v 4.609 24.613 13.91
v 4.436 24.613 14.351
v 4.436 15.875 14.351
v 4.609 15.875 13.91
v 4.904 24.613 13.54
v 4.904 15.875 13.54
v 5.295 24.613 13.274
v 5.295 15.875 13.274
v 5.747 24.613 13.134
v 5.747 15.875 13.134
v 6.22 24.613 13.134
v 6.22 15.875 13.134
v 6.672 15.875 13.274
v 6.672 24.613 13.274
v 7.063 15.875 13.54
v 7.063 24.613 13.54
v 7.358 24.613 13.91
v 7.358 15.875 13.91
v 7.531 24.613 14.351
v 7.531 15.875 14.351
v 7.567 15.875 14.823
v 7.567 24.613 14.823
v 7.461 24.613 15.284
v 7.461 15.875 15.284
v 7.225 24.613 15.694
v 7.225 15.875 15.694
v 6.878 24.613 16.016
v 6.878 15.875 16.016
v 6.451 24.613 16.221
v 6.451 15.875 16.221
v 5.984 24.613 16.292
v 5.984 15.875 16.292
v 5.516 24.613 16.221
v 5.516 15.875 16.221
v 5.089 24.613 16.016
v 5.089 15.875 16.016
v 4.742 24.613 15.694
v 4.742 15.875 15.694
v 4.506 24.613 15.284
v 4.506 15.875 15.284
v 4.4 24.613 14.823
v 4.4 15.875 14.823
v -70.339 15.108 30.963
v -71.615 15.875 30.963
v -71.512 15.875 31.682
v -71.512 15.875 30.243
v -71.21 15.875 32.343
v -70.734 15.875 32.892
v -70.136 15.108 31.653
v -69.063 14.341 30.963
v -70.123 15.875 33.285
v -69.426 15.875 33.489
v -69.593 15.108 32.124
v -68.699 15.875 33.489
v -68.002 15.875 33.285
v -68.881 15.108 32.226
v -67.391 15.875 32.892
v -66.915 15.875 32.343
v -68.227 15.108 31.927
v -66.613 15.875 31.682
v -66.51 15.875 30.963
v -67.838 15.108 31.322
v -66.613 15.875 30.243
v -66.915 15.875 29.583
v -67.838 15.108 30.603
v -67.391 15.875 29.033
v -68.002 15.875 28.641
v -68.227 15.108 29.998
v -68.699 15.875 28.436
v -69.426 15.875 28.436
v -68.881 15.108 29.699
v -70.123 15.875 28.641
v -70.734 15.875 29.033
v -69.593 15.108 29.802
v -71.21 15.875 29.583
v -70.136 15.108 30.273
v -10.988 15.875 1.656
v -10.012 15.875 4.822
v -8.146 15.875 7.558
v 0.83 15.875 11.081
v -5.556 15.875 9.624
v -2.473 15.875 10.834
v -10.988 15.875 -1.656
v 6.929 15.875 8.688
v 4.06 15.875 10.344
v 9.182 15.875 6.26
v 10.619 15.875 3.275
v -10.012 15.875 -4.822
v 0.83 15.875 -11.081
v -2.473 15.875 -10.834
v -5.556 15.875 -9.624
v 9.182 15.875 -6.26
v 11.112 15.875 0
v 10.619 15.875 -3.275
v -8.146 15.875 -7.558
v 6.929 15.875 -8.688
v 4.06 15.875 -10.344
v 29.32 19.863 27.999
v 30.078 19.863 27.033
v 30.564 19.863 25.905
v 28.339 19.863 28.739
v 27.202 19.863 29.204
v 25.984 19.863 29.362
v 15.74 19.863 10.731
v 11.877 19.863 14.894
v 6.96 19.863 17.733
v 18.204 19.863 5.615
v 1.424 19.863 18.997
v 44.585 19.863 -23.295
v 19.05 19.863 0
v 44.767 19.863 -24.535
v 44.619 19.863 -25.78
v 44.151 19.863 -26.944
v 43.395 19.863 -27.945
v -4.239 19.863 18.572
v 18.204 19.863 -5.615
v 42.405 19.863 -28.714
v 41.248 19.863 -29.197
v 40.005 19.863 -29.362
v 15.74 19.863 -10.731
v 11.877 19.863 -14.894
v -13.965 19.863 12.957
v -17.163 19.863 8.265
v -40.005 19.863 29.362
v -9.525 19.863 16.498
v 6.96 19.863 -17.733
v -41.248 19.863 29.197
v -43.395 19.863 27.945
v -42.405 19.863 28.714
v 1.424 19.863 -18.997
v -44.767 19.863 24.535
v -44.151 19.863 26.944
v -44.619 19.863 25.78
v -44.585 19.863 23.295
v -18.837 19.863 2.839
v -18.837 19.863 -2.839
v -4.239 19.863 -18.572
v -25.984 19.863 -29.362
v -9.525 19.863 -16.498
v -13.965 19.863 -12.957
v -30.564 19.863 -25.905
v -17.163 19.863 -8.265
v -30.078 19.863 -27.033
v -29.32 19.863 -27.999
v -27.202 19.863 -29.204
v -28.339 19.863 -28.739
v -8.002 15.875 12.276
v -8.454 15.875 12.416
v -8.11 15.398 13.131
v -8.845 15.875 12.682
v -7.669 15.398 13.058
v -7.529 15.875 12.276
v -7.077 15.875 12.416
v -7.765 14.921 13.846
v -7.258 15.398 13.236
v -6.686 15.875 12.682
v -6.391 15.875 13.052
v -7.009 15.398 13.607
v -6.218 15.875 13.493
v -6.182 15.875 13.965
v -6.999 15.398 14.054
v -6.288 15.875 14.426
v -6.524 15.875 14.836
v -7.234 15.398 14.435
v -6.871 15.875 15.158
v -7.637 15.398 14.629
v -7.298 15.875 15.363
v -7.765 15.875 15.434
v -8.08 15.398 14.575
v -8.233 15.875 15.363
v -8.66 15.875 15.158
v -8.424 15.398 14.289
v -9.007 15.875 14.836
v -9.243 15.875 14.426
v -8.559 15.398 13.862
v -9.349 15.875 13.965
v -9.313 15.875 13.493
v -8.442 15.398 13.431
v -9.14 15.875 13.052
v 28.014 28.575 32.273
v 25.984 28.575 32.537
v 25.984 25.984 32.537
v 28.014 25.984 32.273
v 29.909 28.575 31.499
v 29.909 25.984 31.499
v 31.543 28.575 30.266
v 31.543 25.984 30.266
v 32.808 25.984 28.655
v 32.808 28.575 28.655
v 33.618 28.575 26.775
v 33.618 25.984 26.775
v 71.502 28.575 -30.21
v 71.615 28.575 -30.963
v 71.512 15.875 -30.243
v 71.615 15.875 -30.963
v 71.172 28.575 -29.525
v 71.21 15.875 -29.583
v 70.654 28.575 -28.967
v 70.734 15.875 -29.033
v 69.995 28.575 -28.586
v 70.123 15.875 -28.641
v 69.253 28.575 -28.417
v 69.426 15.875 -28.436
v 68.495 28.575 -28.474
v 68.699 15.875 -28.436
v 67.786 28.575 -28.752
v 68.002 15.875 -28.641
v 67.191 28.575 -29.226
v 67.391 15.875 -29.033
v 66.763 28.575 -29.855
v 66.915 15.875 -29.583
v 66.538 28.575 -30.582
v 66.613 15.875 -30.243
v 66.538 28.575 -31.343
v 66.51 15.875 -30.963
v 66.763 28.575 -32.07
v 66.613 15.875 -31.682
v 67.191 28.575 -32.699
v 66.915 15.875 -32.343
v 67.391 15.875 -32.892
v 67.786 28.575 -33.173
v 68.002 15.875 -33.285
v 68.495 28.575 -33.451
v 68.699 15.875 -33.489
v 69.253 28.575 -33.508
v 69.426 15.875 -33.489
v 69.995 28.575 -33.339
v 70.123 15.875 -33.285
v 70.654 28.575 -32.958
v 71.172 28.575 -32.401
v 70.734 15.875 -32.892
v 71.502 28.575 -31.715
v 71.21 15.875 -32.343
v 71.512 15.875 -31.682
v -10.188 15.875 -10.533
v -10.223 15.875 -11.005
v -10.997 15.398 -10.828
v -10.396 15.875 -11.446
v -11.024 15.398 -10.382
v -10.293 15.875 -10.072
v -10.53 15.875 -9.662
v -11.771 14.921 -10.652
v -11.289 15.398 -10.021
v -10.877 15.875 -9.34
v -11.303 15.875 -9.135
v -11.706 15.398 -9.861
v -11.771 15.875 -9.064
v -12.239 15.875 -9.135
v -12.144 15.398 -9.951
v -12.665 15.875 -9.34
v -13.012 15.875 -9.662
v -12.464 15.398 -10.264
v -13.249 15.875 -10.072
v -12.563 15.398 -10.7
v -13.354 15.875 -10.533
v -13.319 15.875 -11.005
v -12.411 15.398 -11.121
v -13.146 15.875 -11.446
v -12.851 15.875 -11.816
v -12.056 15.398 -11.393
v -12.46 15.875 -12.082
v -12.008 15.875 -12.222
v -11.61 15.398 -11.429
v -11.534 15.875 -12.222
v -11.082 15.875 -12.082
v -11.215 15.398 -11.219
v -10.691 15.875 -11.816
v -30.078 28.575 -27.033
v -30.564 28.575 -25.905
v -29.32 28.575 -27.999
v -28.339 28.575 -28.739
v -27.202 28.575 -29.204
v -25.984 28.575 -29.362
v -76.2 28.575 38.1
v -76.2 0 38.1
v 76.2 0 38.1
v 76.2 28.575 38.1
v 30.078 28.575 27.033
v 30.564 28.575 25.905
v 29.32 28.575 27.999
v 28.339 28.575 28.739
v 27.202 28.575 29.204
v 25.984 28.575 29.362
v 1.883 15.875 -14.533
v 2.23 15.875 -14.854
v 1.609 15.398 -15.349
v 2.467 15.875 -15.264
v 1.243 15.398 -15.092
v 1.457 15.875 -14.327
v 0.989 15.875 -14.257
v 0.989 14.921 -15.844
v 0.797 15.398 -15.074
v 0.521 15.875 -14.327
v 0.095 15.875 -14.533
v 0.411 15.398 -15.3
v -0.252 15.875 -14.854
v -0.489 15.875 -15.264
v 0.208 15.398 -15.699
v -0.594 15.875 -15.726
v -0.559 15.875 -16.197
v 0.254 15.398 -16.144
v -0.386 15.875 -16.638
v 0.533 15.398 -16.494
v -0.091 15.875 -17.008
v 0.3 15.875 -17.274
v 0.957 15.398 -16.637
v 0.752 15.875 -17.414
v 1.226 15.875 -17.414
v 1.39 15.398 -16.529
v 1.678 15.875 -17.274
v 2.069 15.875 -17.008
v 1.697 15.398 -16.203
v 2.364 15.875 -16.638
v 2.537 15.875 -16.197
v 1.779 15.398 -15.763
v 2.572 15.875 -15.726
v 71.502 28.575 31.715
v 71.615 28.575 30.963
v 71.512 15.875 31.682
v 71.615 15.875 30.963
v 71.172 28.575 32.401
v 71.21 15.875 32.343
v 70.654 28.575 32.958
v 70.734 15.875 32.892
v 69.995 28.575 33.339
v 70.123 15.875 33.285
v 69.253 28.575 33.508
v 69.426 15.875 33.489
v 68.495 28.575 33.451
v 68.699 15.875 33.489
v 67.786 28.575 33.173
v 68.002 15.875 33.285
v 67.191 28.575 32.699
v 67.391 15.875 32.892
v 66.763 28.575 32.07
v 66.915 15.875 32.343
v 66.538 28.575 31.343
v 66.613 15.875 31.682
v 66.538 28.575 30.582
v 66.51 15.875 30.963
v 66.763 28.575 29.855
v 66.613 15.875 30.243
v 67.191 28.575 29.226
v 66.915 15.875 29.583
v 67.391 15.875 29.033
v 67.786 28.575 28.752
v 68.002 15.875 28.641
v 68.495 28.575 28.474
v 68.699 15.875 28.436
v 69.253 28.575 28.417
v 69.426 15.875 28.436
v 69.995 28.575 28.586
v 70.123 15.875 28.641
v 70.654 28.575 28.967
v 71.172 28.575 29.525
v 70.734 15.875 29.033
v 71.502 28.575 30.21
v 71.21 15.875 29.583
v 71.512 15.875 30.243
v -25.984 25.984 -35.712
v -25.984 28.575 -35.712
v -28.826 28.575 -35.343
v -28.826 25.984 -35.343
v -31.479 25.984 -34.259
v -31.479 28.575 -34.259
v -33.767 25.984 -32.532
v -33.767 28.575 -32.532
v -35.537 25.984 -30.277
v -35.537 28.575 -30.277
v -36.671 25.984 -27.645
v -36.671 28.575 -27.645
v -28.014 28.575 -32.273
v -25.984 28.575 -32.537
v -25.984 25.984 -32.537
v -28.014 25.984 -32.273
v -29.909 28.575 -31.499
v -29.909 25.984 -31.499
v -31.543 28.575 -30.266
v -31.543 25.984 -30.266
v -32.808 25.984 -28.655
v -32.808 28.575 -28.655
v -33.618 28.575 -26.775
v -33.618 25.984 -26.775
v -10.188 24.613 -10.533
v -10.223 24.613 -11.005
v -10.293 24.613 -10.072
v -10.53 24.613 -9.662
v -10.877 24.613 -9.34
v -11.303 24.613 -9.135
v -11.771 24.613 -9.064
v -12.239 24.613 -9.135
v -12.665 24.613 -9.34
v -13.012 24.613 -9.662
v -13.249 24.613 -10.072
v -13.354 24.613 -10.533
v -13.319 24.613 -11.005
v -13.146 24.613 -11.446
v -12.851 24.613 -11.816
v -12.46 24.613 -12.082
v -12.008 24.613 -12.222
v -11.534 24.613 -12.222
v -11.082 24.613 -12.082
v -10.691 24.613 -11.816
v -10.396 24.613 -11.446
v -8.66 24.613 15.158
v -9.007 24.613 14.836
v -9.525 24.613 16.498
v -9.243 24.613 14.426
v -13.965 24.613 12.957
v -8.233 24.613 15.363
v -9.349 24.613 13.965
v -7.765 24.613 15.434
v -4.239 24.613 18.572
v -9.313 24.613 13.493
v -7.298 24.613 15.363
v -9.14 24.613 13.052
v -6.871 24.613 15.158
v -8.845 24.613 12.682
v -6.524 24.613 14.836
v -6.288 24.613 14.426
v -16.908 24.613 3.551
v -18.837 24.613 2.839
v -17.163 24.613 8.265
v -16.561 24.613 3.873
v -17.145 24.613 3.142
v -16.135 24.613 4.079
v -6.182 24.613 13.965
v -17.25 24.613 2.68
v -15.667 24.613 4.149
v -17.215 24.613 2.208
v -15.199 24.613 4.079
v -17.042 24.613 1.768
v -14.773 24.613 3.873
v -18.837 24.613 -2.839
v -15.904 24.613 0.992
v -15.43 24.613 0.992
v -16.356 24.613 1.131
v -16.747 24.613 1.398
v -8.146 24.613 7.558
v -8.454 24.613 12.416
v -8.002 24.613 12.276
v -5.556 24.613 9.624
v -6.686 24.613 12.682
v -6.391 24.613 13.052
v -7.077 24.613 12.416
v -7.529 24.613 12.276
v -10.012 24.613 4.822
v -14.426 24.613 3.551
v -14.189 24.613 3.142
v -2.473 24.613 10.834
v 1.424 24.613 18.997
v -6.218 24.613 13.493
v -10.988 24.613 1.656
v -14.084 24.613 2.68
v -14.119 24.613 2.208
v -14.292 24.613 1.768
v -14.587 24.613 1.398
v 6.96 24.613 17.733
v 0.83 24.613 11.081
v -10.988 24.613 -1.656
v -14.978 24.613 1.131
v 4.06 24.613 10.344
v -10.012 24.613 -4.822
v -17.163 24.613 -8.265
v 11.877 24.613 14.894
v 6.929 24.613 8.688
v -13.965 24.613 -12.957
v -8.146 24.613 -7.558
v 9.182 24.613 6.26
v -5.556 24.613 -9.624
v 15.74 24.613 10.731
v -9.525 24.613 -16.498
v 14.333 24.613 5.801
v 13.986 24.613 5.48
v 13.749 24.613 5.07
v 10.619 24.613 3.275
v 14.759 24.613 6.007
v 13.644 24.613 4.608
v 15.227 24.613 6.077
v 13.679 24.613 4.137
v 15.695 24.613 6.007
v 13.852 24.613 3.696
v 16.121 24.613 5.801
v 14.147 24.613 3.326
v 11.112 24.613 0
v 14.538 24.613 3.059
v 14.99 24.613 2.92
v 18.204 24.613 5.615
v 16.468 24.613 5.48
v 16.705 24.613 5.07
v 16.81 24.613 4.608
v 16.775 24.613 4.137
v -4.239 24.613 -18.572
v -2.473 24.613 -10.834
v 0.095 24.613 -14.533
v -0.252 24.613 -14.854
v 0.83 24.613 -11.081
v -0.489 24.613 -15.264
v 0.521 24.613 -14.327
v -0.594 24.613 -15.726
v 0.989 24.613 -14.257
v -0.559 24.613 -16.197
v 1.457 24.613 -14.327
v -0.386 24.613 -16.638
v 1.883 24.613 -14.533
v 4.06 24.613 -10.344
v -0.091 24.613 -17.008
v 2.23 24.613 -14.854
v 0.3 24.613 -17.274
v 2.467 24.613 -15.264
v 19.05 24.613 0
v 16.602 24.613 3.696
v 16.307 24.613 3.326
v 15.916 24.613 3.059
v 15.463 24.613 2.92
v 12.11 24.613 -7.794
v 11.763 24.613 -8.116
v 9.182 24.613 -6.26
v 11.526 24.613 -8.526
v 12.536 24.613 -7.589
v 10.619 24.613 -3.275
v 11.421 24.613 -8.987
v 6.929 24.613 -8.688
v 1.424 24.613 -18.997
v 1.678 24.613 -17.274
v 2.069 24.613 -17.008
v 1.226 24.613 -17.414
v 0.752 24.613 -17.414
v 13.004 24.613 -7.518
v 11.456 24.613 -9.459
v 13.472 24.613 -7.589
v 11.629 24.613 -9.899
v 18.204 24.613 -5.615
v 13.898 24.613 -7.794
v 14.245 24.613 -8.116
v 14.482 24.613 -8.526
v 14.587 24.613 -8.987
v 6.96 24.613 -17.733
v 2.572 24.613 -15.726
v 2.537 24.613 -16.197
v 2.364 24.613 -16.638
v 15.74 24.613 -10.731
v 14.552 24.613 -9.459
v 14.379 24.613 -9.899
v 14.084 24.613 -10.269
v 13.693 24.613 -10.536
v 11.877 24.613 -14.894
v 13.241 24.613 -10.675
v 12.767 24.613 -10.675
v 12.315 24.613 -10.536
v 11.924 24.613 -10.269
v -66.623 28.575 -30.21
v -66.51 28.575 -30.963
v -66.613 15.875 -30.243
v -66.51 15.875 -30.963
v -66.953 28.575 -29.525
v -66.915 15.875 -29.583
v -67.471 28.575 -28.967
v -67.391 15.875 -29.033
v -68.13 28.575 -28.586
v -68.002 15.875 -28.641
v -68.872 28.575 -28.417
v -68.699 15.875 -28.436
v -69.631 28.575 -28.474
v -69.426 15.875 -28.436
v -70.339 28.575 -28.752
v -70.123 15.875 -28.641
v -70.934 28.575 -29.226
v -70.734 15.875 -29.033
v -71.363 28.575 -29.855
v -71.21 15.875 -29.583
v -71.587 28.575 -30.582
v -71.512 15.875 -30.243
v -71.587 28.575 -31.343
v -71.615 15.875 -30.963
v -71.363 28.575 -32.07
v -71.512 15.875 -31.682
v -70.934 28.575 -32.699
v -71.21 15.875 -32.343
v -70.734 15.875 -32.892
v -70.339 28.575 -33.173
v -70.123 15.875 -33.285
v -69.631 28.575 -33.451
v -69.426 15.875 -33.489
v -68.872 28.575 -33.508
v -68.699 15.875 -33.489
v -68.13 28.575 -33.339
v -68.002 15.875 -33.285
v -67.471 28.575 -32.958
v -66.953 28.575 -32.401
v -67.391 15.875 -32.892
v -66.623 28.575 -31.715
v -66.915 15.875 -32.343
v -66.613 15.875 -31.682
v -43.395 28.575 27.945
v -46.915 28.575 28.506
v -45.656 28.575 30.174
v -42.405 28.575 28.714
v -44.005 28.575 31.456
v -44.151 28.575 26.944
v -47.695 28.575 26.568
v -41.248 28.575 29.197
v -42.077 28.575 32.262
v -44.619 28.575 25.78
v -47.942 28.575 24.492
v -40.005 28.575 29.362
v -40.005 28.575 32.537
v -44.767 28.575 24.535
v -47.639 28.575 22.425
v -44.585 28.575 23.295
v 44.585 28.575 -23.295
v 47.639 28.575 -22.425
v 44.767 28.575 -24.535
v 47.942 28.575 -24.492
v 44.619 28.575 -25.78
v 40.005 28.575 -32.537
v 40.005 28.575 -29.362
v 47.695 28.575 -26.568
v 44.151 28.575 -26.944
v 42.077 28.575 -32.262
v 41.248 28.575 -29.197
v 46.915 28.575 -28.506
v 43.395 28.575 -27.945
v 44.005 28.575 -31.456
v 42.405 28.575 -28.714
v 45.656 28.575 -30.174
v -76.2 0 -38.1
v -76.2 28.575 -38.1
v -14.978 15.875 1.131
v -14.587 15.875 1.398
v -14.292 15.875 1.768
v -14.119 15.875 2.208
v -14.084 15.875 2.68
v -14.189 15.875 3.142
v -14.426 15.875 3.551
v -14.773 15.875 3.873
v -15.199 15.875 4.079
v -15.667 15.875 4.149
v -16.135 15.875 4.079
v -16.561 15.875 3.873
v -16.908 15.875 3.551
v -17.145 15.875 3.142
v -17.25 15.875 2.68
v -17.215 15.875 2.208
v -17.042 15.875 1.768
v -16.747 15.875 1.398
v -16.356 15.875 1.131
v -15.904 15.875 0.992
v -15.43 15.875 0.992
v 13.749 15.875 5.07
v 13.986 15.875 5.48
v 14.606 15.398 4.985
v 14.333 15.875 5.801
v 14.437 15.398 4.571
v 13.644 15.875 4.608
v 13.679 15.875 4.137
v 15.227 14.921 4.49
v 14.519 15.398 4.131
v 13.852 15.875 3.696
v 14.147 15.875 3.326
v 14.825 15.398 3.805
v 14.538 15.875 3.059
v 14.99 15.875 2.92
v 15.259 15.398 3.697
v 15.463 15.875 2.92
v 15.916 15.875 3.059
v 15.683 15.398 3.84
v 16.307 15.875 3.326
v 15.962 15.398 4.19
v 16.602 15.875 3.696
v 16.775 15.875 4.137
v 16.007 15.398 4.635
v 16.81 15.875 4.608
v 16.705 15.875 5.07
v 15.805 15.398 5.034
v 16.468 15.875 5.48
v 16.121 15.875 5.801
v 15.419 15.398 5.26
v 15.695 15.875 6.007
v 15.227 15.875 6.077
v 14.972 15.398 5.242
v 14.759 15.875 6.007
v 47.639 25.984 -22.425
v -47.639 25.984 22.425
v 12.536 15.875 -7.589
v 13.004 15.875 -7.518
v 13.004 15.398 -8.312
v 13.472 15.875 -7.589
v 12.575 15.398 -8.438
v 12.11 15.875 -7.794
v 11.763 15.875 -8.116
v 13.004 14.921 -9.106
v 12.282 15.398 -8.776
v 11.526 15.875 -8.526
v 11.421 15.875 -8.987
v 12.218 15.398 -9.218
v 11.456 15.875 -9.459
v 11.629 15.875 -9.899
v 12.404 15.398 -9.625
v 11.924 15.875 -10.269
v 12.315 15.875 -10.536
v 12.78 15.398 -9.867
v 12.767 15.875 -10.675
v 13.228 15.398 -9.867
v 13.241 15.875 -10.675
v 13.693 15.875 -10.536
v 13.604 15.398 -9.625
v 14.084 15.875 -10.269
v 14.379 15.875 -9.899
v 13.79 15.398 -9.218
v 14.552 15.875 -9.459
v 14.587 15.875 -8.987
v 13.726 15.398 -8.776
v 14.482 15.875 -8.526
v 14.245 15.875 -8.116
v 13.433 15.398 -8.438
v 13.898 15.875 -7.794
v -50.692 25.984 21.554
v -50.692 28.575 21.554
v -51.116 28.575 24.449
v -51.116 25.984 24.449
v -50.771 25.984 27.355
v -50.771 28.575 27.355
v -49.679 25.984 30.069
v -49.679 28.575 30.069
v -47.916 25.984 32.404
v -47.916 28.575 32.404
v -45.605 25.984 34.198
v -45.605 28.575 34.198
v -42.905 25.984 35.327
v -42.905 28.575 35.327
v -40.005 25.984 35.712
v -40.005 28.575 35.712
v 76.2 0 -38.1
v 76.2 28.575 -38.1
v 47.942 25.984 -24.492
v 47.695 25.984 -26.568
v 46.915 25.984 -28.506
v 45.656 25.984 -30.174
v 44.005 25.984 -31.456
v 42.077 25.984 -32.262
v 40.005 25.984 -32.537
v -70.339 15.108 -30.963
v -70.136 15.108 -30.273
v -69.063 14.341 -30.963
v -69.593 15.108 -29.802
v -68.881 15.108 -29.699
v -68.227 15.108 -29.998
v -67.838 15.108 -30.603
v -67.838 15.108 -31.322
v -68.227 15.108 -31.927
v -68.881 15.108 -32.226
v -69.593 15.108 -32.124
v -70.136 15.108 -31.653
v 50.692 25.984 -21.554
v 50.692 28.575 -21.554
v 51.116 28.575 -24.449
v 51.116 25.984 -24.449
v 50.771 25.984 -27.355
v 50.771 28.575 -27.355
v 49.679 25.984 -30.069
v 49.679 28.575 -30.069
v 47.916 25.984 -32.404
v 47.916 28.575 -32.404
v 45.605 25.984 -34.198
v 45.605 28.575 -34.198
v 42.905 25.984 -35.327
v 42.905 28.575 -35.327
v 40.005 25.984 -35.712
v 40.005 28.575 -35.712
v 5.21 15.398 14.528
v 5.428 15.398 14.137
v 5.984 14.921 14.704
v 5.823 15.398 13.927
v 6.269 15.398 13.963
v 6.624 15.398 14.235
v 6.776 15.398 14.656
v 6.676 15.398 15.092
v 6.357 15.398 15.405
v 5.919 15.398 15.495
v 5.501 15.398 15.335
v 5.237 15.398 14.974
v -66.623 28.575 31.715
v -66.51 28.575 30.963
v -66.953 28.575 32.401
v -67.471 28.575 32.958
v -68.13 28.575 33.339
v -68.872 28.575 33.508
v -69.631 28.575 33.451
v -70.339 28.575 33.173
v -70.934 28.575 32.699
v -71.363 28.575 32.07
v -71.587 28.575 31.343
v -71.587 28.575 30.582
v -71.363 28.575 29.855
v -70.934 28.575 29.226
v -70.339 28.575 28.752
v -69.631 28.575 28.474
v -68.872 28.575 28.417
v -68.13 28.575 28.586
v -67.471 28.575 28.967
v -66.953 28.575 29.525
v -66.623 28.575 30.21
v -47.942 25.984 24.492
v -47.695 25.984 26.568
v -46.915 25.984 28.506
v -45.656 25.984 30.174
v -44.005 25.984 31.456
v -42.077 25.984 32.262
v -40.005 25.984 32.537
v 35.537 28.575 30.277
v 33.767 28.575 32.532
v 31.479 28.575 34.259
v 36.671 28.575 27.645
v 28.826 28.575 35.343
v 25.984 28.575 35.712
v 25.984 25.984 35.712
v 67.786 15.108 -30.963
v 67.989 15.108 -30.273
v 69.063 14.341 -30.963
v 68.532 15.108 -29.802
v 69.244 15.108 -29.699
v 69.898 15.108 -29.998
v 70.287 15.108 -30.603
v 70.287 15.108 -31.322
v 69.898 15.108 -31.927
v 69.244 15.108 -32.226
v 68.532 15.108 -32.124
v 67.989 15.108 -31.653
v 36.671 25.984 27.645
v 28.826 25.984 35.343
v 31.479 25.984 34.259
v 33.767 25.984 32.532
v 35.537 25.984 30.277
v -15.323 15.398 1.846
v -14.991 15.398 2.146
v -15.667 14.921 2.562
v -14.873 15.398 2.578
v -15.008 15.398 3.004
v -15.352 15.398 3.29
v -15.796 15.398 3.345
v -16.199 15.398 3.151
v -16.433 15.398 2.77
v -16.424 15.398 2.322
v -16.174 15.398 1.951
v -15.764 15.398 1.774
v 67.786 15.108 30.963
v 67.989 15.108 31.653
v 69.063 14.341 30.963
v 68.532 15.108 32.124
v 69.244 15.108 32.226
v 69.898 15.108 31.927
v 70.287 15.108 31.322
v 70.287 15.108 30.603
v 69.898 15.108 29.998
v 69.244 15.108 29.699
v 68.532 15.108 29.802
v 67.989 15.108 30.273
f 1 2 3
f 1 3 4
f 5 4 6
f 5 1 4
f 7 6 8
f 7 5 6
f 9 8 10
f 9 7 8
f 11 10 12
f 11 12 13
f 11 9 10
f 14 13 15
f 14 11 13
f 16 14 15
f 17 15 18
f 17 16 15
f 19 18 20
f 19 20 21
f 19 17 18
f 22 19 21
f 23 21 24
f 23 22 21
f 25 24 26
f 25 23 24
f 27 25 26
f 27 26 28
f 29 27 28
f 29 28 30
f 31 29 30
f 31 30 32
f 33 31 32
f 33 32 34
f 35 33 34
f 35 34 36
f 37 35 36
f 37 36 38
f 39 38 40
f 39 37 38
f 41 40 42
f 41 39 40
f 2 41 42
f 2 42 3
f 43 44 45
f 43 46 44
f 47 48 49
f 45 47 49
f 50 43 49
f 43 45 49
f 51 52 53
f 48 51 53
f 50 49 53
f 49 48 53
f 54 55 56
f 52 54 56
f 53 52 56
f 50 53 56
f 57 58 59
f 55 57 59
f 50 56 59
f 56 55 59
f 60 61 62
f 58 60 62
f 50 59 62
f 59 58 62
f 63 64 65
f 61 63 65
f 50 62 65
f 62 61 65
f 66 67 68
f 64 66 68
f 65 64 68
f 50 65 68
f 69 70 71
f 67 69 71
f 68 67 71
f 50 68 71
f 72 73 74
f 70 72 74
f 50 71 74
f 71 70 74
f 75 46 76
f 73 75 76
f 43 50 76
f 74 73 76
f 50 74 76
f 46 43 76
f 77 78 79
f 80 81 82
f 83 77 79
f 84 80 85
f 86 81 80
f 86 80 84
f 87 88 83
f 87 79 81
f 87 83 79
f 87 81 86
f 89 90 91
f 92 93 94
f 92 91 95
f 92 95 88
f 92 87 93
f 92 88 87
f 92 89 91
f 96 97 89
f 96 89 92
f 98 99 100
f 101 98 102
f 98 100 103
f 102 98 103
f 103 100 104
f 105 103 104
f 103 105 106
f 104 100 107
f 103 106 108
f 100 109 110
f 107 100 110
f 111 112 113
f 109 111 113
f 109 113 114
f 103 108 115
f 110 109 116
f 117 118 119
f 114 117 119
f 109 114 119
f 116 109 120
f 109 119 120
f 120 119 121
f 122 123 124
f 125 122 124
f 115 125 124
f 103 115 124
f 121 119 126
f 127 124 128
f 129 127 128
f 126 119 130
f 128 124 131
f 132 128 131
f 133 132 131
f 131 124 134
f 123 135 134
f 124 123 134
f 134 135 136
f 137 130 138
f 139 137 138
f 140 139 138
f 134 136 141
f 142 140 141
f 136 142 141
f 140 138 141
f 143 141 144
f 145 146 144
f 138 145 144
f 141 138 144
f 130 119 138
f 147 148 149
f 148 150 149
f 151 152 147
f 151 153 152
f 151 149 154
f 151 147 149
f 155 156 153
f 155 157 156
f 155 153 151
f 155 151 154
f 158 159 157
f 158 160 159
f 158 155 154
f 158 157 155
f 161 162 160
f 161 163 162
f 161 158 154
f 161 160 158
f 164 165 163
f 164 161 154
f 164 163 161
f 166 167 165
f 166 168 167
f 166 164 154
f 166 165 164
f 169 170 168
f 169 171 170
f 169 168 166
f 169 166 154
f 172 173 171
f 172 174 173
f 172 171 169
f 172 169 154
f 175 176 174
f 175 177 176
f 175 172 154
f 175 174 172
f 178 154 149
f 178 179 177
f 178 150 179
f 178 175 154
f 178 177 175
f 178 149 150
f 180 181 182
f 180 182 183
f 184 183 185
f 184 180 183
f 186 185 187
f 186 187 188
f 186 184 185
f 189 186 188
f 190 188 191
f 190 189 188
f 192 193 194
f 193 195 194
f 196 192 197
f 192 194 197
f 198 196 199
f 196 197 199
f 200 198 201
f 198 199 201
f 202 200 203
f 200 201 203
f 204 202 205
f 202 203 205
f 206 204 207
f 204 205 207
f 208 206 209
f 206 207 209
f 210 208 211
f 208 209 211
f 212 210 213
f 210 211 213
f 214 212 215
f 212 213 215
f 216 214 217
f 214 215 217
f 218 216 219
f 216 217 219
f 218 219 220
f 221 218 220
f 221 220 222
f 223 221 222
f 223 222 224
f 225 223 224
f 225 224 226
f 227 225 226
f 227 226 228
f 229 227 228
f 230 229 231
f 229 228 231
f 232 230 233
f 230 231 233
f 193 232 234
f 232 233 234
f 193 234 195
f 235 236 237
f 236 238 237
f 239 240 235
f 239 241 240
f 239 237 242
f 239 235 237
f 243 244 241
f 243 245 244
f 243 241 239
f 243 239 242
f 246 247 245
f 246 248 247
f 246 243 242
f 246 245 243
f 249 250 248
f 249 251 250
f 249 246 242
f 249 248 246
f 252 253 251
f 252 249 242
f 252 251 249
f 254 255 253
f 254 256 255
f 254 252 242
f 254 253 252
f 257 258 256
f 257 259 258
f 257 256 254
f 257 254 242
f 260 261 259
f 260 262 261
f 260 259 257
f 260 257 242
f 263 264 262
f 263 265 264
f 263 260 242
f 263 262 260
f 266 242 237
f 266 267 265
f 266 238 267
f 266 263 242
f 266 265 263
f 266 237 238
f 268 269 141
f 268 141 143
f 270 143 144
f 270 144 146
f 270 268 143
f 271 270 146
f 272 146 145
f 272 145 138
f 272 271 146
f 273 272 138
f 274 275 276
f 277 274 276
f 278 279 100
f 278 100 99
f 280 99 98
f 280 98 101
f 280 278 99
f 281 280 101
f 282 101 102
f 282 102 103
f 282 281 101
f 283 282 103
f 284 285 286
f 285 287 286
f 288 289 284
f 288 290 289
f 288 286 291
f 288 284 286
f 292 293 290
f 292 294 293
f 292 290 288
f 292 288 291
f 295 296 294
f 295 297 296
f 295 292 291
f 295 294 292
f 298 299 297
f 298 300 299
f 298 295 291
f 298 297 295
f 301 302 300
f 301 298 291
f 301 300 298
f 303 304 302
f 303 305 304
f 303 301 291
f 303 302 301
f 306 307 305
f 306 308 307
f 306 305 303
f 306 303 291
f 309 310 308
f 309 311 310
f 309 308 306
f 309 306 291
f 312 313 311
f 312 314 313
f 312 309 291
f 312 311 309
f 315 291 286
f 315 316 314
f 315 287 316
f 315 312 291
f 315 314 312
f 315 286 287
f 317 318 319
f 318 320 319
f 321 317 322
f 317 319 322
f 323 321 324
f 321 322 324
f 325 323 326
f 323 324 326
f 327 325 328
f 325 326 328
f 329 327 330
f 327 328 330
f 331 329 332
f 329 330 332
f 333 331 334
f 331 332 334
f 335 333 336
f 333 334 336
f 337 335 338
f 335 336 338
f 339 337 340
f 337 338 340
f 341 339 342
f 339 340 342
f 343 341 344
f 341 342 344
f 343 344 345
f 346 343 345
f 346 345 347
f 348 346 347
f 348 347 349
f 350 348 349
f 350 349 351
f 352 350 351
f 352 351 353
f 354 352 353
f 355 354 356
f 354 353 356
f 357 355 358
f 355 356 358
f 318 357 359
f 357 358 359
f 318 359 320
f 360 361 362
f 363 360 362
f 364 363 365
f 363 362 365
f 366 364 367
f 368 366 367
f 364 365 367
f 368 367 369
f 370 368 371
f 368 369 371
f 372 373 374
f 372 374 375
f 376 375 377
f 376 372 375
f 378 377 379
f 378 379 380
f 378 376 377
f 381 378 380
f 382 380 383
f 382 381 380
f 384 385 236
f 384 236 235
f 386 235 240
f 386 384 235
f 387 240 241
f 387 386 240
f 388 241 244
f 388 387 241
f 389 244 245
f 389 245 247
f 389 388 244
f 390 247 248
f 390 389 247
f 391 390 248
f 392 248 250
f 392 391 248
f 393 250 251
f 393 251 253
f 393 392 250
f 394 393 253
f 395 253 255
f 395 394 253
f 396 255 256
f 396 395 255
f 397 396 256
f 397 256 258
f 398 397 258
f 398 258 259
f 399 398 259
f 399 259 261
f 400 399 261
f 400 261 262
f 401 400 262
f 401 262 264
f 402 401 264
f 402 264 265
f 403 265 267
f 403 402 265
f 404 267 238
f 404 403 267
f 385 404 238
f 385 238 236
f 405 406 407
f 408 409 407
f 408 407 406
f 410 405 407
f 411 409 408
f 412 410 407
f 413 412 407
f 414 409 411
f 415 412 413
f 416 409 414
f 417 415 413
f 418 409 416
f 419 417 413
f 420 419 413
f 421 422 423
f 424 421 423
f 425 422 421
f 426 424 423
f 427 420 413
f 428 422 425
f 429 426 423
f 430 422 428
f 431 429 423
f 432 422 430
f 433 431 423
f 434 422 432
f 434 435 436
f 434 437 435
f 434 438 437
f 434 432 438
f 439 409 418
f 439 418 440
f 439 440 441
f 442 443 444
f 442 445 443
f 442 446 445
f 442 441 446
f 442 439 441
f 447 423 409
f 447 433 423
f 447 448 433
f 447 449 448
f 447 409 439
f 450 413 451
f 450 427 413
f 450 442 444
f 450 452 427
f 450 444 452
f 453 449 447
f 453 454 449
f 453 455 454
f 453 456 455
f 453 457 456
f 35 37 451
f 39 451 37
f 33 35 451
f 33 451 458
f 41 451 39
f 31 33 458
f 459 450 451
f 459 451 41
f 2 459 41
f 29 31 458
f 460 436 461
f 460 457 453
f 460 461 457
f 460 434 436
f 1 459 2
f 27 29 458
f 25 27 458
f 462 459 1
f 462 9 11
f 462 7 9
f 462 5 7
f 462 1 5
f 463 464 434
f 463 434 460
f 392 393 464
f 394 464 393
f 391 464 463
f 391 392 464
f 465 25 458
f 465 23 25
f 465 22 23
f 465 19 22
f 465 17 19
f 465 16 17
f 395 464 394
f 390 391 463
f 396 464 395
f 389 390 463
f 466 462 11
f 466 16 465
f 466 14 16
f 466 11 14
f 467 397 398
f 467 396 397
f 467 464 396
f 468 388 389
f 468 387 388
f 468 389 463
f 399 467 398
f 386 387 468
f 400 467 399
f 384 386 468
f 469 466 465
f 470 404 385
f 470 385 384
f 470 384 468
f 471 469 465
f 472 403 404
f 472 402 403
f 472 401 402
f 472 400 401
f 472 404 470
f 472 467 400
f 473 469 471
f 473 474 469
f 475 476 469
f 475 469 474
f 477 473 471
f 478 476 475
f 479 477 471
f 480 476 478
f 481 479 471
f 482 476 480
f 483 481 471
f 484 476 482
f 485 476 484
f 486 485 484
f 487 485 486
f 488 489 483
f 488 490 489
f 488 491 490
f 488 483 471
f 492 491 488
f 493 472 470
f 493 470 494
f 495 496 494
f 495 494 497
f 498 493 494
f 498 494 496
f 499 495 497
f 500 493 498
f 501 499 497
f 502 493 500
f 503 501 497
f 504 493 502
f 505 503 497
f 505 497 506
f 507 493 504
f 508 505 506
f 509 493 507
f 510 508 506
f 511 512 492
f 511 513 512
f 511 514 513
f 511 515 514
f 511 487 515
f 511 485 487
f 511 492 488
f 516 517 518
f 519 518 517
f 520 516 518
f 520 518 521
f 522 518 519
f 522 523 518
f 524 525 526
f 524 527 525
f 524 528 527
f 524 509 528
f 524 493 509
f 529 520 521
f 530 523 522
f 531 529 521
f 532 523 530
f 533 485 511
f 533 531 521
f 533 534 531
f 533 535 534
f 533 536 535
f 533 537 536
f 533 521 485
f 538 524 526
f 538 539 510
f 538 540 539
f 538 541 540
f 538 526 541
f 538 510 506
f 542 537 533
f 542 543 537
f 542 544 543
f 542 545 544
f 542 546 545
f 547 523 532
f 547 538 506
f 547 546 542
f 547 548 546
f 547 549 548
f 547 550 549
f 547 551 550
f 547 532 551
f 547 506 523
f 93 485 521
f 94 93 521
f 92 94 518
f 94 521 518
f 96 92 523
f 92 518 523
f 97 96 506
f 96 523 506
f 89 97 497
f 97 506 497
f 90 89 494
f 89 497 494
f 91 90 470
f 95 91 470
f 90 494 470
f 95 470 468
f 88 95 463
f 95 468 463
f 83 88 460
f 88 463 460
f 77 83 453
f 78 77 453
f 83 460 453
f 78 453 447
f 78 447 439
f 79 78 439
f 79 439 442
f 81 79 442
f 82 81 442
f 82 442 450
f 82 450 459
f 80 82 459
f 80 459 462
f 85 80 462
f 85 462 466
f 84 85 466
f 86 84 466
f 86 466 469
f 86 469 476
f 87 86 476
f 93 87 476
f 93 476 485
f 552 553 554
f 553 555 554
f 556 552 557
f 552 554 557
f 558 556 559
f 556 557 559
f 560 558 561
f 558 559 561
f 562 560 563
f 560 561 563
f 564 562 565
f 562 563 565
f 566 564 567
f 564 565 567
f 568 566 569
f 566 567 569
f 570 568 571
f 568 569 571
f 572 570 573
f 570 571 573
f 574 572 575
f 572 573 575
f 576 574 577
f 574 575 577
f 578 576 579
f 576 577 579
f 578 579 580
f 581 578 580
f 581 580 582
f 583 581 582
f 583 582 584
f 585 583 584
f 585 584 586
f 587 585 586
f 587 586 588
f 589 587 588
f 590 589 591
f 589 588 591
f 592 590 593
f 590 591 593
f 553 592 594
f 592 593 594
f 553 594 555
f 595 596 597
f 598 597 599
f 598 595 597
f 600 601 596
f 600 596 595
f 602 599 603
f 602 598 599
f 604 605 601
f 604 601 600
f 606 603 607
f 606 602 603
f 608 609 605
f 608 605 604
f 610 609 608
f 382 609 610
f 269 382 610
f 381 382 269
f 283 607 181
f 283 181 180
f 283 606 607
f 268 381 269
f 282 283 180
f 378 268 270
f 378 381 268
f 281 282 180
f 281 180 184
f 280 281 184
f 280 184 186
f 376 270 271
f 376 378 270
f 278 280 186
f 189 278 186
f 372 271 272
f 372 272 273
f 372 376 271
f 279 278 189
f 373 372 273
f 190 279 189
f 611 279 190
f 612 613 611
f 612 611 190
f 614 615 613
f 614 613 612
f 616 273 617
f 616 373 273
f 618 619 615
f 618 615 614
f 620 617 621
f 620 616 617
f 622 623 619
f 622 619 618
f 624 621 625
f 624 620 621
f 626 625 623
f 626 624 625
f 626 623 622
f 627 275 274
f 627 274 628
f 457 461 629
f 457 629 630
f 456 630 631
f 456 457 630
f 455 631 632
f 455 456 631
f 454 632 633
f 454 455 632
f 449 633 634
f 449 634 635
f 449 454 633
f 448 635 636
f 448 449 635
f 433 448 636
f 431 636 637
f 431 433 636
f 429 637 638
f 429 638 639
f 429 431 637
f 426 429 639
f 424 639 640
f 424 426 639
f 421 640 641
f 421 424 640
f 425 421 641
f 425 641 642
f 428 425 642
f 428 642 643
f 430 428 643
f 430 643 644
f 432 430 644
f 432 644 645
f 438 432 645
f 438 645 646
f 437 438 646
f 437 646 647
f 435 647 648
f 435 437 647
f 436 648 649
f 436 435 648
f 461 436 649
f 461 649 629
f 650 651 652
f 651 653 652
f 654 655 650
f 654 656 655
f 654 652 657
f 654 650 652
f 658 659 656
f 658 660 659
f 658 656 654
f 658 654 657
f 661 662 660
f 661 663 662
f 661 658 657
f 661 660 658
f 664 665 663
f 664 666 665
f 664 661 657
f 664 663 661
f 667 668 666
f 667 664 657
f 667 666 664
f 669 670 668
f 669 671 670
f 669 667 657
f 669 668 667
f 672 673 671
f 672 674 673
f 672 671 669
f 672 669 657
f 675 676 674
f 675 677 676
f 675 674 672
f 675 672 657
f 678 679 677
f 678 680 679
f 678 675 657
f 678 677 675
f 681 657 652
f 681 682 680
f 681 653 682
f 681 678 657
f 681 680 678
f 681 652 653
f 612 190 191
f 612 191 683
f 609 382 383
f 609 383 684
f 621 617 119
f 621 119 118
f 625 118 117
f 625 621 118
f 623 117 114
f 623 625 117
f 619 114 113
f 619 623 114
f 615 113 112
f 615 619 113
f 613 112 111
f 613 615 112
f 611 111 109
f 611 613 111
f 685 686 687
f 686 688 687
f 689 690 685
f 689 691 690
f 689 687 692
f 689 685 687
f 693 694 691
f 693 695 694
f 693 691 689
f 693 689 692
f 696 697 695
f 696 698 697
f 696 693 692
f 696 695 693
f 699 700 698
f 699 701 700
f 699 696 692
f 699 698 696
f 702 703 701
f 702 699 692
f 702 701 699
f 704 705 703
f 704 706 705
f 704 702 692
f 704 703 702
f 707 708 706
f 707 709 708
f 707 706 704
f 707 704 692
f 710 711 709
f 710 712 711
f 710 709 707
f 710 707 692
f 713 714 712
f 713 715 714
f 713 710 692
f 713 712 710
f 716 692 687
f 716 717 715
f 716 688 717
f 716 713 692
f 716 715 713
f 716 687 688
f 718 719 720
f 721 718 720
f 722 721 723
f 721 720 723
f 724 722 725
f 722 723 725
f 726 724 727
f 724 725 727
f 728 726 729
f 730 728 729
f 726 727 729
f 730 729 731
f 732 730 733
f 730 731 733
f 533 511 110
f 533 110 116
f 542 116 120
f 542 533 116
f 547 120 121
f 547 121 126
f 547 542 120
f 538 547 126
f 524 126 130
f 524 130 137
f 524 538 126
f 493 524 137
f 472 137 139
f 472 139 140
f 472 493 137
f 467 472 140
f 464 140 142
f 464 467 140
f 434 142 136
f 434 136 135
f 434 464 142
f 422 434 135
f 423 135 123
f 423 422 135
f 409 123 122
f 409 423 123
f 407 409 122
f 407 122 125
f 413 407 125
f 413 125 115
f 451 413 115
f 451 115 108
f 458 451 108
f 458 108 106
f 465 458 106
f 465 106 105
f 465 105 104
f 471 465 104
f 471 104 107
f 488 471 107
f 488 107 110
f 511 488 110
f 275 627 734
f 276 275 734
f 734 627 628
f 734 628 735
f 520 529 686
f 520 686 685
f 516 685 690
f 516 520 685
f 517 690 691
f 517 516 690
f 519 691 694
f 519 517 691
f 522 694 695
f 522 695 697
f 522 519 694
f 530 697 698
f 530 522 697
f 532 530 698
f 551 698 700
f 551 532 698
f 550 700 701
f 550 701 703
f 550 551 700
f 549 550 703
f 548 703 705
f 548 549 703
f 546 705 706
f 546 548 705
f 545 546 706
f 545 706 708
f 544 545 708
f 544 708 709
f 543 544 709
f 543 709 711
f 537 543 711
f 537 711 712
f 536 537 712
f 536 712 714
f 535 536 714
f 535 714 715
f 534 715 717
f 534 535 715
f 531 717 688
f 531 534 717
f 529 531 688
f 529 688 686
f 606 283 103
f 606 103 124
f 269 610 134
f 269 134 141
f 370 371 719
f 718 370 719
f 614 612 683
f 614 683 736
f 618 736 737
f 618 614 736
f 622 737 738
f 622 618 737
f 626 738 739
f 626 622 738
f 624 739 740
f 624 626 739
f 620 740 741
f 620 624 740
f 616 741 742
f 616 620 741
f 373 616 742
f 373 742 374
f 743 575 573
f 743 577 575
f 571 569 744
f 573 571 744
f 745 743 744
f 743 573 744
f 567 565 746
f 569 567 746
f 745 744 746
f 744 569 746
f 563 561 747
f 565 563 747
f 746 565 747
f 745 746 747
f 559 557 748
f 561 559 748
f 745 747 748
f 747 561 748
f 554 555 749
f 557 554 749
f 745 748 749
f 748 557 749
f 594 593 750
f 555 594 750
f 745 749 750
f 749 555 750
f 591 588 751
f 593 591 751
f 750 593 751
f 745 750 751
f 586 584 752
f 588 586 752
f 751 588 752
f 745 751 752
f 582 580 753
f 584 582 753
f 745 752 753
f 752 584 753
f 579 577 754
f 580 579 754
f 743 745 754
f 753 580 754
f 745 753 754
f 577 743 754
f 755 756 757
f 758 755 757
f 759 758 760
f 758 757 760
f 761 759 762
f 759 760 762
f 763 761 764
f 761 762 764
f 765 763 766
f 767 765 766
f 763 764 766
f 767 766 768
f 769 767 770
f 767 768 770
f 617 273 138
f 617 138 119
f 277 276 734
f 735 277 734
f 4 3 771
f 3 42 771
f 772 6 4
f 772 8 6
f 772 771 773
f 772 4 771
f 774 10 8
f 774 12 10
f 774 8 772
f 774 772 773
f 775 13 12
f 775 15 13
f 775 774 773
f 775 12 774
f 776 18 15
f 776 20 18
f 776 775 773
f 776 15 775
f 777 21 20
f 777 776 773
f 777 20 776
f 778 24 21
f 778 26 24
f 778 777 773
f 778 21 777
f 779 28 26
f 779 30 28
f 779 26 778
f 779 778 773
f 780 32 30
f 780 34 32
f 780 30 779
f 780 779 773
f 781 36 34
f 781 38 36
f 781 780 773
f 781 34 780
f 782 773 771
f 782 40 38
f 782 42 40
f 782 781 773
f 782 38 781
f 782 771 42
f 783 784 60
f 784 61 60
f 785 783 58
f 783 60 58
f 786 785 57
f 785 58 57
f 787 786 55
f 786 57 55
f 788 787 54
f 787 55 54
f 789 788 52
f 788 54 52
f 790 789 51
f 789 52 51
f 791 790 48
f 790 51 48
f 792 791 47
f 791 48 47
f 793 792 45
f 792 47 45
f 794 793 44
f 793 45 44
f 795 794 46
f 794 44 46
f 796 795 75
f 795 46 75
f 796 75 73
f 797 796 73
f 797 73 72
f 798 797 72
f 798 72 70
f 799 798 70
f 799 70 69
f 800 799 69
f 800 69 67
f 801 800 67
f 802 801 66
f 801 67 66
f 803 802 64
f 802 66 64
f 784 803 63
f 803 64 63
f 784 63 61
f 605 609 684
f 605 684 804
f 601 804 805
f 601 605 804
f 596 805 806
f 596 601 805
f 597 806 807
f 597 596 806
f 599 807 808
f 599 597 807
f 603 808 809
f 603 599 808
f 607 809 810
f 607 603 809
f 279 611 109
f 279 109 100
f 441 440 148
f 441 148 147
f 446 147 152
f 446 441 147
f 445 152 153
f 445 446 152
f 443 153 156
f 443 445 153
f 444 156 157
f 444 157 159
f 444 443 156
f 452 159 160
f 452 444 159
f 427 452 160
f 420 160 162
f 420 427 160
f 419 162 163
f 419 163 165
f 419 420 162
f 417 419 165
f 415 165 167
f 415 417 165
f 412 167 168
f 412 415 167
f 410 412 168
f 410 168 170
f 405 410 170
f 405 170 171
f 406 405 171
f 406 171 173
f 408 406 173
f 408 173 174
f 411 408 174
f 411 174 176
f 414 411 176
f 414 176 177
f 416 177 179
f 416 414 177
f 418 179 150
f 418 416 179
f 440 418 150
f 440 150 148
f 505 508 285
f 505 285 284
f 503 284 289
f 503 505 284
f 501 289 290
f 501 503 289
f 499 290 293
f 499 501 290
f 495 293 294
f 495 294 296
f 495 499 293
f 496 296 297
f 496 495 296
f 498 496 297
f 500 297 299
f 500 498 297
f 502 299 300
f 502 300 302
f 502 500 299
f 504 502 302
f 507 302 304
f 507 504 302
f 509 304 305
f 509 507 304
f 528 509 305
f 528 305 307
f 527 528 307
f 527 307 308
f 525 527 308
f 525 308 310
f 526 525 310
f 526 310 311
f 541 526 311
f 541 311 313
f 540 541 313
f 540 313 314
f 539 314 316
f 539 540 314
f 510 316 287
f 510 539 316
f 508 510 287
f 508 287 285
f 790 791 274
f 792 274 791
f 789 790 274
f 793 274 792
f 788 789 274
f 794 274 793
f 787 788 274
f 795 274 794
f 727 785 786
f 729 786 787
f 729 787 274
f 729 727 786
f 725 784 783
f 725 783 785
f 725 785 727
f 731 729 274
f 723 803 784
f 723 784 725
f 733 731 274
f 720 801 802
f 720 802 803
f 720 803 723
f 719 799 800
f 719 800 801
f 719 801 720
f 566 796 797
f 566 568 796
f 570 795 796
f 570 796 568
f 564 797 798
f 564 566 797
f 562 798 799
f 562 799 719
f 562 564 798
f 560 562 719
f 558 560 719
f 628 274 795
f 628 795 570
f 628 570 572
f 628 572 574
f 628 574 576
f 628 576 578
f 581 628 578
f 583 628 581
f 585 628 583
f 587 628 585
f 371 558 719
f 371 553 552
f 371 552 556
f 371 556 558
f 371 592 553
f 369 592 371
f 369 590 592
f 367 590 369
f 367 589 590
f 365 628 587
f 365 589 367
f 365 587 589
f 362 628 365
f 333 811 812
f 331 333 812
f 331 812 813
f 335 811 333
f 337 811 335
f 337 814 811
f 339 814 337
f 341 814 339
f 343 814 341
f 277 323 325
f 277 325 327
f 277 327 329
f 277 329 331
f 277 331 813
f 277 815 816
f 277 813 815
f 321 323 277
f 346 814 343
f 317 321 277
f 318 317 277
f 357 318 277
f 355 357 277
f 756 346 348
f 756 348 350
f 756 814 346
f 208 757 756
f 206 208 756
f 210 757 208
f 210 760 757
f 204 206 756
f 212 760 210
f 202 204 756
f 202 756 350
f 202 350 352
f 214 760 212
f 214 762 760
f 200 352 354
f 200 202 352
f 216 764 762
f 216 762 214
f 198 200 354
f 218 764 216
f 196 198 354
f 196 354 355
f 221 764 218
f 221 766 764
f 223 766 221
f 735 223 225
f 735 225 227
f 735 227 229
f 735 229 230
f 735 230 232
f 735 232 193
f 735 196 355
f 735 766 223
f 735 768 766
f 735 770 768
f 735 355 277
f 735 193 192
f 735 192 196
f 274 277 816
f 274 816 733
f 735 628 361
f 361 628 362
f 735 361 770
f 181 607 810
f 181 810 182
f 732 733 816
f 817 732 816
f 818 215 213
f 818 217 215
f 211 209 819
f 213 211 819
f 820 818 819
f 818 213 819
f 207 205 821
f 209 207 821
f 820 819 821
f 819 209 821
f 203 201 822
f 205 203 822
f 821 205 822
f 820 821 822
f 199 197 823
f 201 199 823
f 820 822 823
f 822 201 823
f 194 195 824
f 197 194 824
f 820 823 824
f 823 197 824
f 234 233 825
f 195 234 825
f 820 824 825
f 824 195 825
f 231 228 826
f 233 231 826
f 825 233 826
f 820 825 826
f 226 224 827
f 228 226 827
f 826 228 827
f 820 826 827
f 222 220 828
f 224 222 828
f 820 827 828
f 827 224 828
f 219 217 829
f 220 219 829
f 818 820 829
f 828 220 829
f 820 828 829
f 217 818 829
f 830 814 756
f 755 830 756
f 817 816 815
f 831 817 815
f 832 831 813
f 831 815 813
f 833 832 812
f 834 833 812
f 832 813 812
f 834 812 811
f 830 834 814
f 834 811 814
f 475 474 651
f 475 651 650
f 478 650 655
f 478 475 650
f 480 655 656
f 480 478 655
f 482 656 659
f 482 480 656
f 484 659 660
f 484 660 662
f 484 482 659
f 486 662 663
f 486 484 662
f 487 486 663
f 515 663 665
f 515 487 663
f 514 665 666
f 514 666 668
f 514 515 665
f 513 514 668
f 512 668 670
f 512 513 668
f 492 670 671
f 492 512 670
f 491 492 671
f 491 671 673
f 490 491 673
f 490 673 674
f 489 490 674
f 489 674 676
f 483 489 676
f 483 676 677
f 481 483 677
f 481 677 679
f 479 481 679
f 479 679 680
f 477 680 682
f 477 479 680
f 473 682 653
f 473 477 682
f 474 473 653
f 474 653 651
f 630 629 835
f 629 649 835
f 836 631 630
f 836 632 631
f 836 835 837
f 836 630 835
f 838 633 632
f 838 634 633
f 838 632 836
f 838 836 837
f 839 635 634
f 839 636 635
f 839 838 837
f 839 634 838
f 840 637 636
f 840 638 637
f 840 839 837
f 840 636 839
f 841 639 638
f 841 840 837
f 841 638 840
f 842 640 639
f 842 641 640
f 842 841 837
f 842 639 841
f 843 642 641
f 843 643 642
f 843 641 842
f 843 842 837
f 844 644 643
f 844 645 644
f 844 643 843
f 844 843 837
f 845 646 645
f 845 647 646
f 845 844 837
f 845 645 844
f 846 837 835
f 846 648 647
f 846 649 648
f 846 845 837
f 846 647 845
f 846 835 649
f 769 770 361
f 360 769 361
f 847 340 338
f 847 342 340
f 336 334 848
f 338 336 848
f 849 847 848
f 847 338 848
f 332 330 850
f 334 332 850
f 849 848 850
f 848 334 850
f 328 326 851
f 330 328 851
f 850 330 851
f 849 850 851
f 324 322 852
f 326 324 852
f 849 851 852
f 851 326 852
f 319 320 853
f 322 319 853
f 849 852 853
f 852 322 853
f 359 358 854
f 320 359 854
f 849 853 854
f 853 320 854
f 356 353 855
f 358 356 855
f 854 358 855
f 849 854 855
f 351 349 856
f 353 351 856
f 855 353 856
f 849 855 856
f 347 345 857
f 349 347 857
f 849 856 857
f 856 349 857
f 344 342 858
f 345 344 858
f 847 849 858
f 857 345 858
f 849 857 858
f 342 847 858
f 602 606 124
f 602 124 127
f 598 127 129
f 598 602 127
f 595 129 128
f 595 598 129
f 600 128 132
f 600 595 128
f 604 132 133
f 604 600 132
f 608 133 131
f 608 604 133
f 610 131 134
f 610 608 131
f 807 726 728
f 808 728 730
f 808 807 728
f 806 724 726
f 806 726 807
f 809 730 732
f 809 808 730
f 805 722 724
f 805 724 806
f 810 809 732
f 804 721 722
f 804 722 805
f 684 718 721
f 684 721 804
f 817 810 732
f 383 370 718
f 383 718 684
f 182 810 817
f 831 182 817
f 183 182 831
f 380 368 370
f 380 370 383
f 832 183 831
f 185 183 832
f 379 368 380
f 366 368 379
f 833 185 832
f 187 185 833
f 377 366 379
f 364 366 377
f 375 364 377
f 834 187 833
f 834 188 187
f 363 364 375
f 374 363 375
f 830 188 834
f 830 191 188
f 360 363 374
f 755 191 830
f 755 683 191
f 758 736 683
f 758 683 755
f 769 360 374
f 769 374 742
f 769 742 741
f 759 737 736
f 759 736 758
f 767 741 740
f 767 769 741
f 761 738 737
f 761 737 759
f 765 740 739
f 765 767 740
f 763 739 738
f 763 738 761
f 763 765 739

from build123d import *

# Parameters (mm, degrees)
SKETCH1_W                      = 152.4
SKETCH1_H                      = 76.2
BOSS_EXTRUDE1_DEPTH            = 28.575
F_7_0_201_DIAMETER_HOLE1_D     = 5.1054
F_7_0_201_DIAMETER_HOLE1_DEPTH = 12.7
F_7_0_201_DIAMETER_HOLE1_TIP   = 1.533816902
SKETCH4_R                      = 11.1125
CUT_EXTRUDE1_DEPTH             = 12.7
CIRPATTERN2_COUNT              = 7
SKETCH9_R                      = 19.05
CUT_EXTRUDE5_DEPTH             = 3.9624
SKETCH10_R                     = 19.05
CUT_EXTRUDE6_DEPTH             = 8.7122
CUT_EXTRUDE7_DEPTH             = 2.5908


with BuildPart() as part:
    # Sketch1 → Boss-Extrude1 (new body)
    with BuildSketch(Plane(origin=(0, 0, 0), x_dir=(1, 0, 0), z_dir=(0, 1, 0))):
        Rectangle(SKETCH1_W, SKETCH1_H)
    extrude(amount=BOSS_EXTRUDE1_DEPTH)

    # #7 (0.201) Diameter Hole1
    with Locations(Plane(origin=(0, 28.575, 0), x_dir=(-1, 0, 0), z_dir=(0, 1, 0))):
        with Locations((69.0626, -30.9626), (69.0626, 30.9626), (-69.0626, 30.9626), (-69.0626, -30.9626)):
            Hole(F_7_0_201_DIAMETER_HOLE1_D / 2, depth=F_7_0_201_DIAMETER_HOLE1_DEPTH)
            with Locations((0, 0, -(F_7_0_201_DIAMETER_HOLE1_DEPTH + F_7_0_201_DIAMETER_HOLE1_TIP / 2))):  # 118° drill point
                Cone(0, F_7_0_201_DIAMETER_HOLE1_D / 2, F_7_0_201_DIAMETER_HOLE1_TIP, mode=Mode.SUBTRACT)

    # Sketch4 → Cut-Extrude1 (cut)
    with BuildSketch(Plane(origin=(0, 28.575, 0), x_dir=(1, 0, 0), z_dir=(0, 1, 0))):
        Circle(SKETCH4_R)
    extrude(amount=-CUT_EXTRUDE1_DEPTH, mode=Mode.SUBTRACT)

    # Sketch14 → 1/8 (0.125) Diameter Hole2 (revolve, cut)
    with BuildSketch(Plane(origin=(13.004038703, 28.575, -9.105525927), x_dir=(0, 0, 1), z_dir=(1, 0, 0))):
        Polygon((0, 0), (0, 13.653866233), (1.5875, 12.7), (1.5875, 0), align=None)
    f_1_8_0_125_diameter_hole2 = revolve(axis=Axis((13.004038703, 34.925, -9.105525927), (0, -1, 0)), mode=Mode.SUBTRACT)

    # CirPattern2: 1/8 (0.125) Diameter Hole2 ×7 about axis
    cirpattern2_axis = Axis((0, 0, 0), (0, 1, 0))
    for i in range(1, CIRPATTERN2_COUNT):
        add(f_1_8_0_125_diameter_hole2.rotate(cirpattern2_axis, i * 360 / CIRPATTERN2_COUNT), mode=Mode.SUBTRACT)

    # Sketch9 → Cut-Extrude5 (cut)
    with BuildSketch(Plane(origin=(0, 28.575, 0), x_dir=(1, 0, 0), z_dir=(0, 1, 0))):
        Circle(SKETCH9_R)
    extrude(amount=-CUT_EXTRUDE5_DEPTH, mode=Mode.SUBTRACT)

    # Sketch10 → Cut-Extrude6 (cut)
    with BuildSketch(Plane(origin=(0, 28.575, 0), x_dir=(1, 0, 0), z_dir=(0, 1, 0))):
        with BuildLine():
            Line((-25.9842, 29.3624), (40.005, 29.3624))
            ThreePointArc((40.005, 29.3624), (43.806157259, 27.469152471), (44.585149022, 23.294663934))
            Line((44.585149022, 23.294663934), (30.564349022, -25.905136066))
            ThreePointArc((30.564349022, -25.905136066), (28.853452471, -28.401057259), (25.9842, -29.3624))
            Line((25.9842, -29.3624), (-40.005, -29.3624))
            ThreePointArc((-40.005, -29.3624), (-43.806157259, -27.469152471), (-44.585149022, -23.294663934))
            Line((-44.585149022, -23.294663934), (-30.564349022, 25.905136066))
            ThreePointArc((-30.564349022, 25.905136066), (-28.853452471, 28.401057259), (-25.9842, 29.3624))
        make_face()
        Circle(SKETCH10_R, mode=Mode.SUBTRACT)
    extrude(amount=-CUT_EXTRUDE6_DEPTH, mode=Mode.SUBTRACT)

    # Sketch11 → Cut-Extrude7 (cut)
    with BuildSketch(Plane(origin=(0, 28.575, 0), x_dir=(1, 0, 0), z_dir=(0, 1, 0))):
        with BuildLine():
            Line((-36.671214384, 27.645450821), (-50.692014384, -21.554349179))
            ThreePointArc((-50.692014384, -21.554349179), (-48.874366938, -31.294822432), (-40.005, -35.7124))
            Line((-40.005, -35.7124), (25.9842, -35.7124))
            ThreePointArc((25.9842, -35.7124), (32.679122432, -33.469266938), (36.671214384, -27.645450821))
            Line((36.671214384, -27.645450821), (50.692014384, 21.554349179))
            ThreePointArc((50.692014384, 21.554349179), (48.874366938, 31.294822432), (40.005, 35.7124))
            Line((40.005, 35.7124), (-25.9842, 35.7124))
            ThreePointArc((-25.9842, 35.7124), (-32.679122432, 33.469266938), (-36.671214384, 27.645450821))
        make_face()
        with BuildLine():
            Line((-33.617781703, 26.775293443), (-47.638581703, -22.424506557))
            ThreePointArc((-47.638581703, -22.424506557), (-46.340262098, -29.381987452), (-40.005, -32.5374))
            Line((-40.005, -32.5374), (25.9842, -32.5374))
            ThreePointArc((25.9842, -32.5374), (30.766287452, -30.935162098), (33.617781703, -26.775293443))
            Line((33.617781703, -26.775293443), (47.638581703, 22.424506557))
            ThreePointArc((47.638581703, 22.424506557), (46.340262098, 29.381987452), (40.005, 32.5374))
            Line((40.005, 32.5374), (-25.9842, 32.5374))
            ThreePointArc((-25.9842, 32.5374), (-30.766287452, 30.935162098), (-33.617781703, 26.775293443))
        make_face(mode=Mode.SUBTRACT)
    extrude(amount=-CUT_EXTRUDE7_DEPTH, mode=Mode.SUBTRACT)


solid = part.part
